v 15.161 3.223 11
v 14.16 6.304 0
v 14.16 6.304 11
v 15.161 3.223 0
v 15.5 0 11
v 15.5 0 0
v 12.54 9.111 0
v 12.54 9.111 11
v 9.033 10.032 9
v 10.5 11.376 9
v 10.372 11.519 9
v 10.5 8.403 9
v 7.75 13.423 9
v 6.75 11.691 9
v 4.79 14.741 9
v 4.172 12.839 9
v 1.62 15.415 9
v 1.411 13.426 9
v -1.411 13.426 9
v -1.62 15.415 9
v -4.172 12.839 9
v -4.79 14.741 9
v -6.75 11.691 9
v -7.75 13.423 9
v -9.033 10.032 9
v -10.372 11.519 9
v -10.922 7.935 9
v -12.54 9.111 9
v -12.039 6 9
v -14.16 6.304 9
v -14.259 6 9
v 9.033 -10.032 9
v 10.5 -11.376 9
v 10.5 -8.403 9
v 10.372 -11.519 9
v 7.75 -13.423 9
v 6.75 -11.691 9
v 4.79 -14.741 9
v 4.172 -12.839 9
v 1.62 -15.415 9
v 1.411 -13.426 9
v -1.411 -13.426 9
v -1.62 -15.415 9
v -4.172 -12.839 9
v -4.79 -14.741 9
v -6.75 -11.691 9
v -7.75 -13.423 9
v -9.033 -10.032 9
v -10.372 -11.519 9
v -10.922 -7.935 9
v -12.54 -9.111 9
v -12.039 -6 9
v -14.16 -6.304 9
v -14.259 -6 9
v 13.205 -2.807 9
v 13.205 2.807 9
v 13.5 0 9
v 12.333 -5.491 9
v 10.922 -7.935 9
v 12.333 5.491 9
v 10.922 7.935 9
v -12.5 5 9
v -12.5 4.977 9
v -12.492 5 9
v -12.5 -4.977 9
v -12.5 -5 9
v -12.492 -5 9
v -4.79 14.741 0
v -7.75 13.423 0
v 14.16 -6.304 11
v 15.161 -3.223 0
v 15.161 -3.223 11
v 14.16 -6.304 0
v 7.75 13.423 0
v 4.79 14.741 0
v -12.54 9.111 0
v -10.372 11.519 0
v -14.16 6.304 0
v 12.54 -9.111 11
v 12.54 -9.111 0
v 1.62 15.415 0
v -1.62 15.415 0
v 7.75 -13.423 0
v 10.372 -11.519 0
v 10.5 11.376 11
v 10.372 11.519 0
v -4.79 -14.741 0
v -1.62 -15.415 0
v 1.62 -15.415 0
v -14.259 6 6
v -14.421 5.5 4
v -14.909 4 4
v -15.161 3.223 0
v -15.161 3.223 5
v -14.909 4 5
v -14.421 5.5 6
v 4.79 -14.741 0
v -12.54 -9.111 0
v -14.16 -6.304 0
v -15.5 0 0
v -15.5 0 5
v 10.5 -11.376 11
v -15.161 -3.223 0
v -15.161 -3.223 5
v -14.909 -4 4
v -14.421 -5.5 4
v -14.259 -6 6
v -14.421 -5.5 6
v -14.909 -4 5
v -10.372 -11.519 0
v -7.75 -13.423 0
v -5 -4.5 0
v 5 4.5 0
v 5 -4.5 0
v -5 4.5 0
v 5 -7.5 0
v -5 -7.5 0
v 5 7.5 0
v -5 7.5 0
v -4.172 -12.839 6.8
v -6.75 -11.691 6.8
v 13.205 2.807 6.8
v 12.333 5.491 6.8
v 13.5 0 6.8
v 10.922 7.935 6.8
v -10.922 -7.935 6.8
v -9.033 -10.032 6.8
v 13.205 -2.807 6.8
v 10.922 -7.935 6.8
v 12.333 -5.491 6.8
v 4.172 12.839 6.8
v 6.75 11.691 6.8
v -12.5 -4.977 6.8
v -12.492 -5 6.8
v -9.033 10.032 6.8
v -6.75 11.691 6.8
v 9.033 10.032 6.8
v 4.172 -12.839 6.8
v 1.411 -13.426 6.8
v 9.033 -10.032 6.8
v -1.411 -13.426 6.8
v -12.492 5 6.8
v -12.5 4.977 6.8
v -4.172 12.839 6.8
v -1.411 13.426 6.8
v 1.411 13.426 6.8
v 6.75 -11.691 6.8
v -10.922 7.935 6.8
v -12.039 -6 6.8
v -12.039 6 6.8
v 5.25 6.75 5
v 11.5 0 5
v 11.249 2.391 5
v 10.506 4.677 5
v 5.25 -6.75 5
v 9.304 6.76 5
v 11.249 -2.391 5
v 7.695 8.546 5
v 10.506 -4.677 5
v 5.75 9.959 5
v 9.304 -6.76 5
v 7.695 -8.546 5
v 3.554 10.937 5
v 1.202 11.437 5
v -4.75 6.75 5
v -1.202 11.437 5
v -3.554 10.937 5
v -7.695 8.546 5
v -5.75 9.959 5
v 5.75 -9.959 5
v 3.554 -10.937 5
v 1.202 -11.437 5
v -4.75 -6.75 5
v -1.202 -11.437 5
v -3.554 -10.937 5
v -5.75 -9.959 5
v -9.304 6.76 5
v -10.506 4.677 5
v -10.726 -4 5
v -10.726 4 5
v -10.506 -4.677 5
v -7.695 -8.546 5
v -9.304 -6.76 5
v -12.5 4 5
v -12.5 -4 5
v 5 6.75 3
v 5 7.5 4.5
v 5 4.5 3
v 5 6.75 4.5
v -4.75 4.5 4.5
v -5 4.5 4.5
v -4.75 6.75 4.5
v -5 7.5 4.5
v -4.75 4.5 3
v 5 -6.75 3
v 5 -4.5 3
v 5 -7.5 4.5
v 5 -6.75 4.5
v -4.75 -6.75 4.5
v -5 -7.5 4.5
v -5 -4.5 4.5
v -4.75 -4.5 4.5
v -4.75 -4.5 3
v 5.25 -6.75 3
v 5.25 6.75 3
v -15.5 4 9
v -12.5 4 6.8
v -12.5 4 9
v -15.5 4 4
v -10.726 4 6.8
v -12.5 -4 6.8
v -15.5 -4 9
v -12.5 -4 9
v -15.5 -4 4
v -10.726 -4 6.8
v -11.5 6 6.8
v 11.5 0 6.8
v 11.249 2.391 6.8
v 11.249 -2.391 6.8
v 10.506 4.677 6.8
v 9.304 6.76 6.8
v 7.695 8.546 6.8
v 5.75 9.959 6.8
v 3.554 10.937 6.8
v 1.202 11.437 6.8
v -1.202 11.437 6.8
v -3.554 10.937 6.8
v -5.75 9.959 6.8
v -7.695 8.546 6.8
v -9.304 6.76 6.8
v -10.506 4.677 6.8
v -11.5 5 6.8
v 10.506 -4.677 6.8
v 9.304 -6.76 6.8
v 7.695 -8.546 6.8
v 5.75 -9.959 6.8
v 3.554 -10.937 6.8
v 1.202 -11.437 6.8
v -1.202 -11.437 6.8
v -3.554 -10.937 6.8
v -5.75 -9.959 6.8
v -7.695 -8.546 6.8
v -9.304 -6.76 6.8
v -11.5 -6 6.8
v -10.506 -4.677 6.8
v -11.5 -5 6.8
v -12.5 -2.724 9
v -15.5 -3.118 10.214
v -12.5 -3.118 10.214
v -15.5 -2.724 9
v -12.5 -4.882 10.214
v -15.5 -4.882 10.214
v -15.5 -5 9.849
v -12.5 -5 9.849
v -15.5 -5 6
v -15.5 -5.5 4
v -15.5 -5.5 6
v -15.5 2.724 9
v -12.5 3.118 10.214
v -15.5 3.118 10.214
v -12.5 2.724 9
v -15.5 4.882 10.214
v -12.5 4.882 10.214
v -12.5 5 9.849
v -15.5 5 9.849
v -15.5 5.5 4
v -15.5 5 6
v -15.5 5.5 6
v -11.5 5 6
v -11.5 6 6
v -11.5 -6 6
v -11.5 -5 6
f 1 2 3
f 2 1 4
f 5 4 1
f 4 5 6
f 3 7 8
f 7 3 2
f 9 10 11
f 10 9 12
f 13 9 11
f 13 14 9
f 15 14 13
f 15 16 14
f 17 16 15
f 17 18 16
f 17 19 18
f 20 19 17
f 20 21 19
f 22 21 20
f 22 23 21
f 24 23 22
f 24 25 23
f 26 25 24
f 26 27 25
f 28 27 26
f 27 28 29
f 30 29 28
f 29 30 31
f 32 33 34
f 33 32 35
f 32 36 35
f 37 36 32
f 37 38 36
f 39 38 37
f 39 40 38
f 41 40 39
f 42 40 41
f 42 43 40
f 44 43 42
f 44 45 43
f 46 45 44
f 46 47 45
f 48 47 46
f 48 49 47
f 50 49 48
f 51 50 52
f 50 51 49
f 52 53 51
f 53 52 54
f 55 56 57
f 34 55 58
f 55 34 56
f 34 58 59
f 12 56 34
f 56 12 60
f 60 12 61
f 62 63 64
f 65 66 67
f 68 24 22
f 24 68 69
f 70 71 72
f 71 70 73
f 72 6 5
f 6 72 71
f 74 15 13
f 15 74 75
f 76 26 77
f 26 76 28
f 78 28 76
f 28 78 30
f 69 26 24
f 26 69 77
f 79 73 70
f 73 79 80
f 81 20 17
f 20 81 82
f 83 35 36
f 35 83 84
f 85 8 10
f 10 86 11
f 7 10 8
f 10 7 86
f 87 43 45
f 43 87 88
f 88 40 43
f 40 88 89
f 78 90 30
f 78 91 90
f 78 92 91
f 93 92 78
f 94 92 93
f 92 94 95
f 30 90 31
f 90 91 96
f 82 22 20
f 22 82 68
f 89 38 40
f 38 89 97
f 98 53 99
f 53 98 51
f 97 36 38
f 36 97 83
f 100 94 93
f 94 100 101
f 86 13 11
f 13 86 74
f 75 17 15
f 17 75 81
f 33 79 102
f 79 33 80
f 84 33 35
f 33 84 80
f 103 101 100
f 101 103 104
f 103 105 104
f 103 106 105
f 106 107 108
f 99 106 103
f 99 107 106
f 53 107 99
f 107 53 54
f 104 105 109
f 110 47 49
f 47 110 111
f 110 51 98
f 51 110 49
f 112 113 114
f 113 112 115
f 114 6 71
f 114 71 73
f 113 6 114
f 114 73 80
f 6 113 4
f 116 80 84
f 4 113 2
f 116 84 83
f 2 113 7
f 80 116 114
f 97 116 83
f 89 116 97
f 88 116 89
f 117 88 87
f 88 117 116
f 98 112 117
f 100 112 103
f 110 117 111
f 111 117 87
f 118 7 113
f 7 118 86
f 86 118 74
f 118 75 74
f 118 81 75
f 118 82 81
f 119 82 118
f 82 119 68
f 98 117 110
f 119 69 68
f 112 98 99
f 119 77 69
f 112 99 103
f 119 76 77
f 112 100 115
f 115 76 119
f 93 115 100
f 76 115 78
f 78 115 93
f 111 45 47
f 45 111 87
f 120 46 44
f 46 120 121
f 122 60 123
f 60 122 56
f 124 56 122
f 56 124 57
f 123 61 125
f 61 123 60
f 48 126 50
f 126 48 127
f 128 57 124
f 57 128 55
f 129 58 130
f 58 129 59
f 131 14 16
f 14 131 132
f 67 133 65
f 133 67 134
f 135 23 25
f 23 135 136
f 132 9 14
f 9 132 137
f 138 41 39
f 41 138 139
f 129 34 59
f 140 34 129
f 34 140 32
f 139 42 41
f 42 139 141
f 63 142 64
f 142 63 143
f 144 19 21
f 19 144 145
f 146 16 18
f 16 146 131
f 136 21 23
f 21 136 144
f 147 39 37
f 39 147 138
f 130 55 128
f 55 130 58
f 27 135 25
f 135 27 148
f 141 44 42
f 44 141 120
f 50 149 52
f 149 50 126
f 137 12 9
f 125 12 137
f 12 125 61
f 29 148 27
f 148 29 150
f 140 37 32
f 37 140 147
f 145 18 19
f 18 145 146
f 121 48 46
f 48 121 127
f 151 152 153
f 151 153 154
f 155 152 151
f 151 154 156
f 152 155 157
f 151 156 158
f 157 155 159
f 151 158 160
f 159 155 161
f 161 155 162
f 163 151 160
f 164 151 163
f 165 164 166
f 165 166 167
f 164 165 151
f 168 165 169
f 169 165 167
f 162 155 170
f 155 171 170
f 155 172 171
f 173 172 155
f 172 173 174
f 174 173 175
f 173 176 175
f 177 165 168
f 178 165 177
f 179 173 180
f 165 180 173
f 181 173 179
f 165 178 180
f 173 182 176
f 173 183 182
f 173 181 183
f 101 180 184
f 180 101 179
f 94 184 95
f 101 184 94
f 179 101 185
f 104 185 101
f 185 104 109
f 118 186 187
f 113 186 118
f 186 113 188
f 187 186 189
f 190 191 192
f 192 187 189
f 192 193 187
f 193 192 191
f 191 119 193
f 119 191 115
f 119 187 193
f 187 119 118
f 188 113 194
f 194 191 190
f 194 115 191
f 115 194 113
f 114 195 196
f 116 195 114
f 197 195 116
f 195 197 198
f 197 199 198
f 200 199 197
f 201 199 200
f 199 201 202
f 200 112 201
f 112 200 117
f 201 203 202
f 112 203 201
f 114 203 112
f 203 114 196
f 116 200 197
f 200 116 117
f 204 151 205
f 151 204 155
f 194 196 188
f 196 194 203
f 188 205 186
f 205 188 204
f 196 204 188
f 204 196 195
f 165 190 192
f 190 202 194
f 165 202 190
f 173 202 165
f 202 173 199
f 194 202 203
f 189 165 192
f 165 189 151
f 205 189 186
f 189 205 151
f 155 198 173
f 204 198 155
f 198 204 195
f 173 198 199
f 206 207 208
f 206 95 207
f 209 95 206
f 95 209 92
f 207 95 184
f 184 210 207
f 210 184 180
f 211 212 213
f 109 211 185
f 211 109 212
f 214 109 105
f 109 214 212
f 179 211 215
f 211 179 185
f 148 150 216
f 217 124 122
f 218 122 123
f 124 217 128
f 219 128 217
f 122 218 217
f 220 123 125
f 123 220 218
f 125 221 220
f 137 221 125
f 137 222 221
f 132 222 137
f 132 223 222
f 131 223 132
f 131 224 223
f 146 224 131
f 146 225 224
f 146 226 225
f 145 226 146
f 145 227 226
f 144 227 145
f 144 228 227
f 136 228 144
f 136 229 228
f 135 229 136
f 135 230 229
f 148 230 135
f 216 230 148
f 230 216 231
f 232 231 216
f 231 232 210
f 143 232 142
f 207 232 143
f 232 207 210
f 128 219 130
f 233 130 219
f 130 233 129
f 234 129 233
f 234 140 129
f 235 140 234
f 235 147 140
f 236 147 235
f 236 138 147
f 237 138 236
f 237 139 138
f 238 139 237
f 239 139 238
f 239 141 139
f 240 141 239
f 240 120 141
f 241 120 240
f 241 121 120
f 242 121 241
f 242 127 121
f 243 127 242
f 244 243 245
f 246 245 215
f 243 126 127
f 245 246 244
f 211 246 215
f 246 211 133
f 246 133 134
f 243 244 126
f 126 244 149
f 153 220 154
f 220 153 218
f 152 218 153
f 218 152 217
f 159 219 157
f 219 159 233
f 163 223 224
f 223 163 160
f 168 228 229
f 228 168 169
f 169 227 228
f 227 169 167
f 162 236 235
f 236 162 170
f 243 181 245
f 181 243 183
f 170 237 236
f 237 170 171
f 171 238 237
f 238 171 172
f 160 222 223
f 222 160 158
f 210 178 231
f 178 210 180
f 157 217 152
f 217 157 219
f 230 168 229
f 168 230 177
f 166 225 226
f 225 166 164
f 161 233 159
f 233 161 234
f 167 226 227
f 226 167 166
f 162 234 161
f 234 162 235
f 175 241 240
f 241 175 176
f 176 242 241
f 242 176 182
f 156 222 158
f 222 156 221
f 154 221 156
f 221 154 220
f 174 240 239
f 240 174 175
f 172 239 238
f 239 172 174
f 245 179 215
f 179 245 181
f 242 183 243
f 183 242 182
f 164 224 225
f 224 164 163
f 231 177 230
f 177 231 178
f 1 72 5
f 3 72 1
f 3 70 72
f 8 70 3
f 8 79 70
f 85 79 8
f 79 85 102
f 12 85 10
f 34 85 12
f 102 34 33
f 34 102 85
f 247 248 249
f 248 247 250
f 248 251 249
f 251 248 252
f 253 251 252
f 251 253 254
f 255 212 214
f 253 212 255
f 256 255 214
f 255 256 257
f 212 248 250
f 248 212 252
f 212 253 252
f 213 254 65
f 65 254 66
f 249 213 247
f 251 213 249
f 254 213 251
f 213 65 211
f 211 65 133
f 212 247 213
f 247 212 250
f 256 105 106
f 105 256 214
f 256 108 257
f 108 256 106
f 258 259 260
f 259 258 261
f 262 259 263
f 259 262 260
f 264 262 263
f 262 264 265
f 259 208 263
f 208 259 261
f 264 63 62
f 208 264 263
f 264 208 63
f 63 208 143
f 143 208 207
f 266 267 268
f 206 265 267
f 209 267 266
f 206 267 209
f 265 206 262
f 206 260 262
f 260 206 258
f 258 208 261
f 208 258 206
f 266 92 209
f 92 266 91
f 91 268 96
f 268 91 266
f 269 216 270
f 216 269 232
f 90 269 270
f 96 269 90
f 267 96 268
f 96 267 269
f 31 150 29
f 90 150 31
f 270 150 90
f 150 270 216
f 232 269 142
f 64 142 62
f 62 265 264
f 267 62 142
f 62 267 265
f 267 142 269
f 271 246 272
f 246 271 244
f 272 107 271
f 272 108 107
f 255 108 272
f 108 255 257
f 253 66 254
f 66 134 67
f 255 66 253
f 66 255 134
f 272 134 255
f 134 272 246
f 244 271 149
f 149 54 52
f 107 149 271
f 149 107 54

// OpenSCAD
// This is a led lamp holder to clip onto the RepRap.
//
//  Copyright 2011 John Cooper 
//
//  This program is free software: you can redistribute it and/or modify
//  it under the terms of the GNU General Public License as published by
//  the Free Software Foundation, either version 3 of the License, or
//   (at your option) any later version.
//
//  This program is distributed in the hope that it will be useful,
//  but WITHOUT ANY WARRANTY; without even the implied warranty of
//  MERCHANTABILITY or FITNESS FOR A PARTICULAR PURPOSE.  See the
//  GNU General Public License for more details.
//
//  You should have received a copy of the GNU General Public License
//  along with this program.  If not, see <http://www.gnu.org/licenses/>.

bolt_thickness = 8;
lamp_radius = 27 / 2;
plug_width = 8;
strap_width = 10;

module bolt_clip (bolt_radius, length) {
    difference () {
        cylinder (h=length, r=bolt_radius * 1.1);
        translate ([0, 0, -0.5]) {
            cylinder (h=length + 1, r=bolt_radius);
        }
    }
}

module lamp_holder () {
    union () {
        difference () {
            cylinder ( h=9, r=lamp_radius + 2 );
            translate ([0,0,5]) {
                cylinder ( h=6, r=lamp_radius );
            }
            translate ([-( strap_width / 2 ), lamp_radius / 3, -0.5]) {
                 cube ([strap_width, 3, 5]);
            }
            translate ([-( strap_width / 2 ), - ( lamp_radius / 3 + 3) , -0.5]) {
                 cube ([strap_width, 3, 5]);
            }
            translate ([- (lamp_radius / 2 -2 ), -lamp_radius / 2, 3]) {
                cube ([ strap_width, lamp_radius, 4] );
            }
            // The hole for the connector
            translate ([ - lamp_radius -4 , - plug_width / 2 , 5]) {
                cube([8, plug_width, 6]);
            }
        }
        difference () {
            translate ([0,0,5]) {
                cylinder ( h=3 - 1.2, r=lamp_radius );
            }
            translate ([0,0,4.5]) {
                cylinder ( h=7, r=lamp_radius - 2 );
            }
            translate ([-lamp_radius,-plug_width/2,5]) {
                cube ([5,plug_width,3]);
            }
        }
    }
}

module lamp () {
    union () {
        cylinder (h=3, r=lamp_radius);
        translate ([lamp_radius - 5, - plug_width / 2   , 0]){
            cube ([10,plug_width,3]);
        }
    }
}

module top_clip () {
    intersection () {
        cylinder(h=2, r=lamp_radius + 2);
        translate ([lamp_radius -3 ,-15,0]) {
            cube ([6,30,3]);
        }
    }
}

module cable_clip () {
    union () {
        difference () {
            rotate ([0,90,0]) {
                cylinder (h=3,r=1.5);
            }
            translate ([-0.5,0, -4]) {
                cube ([4,4,4]);
            }
        }
        translate ([0,-1.5,-5]) {
            cube([3,1.5,5]);
        }
    }
}

module complete_lamp_holder () {
    difference () {
        union () {
            lamp_holder ();
            translate ([0,0,9]) {
                top_clip();
            }
            translate ([-(lamp_radius + 2), -plug_width / 2, 6+3]) {
                cable_clip ();
            }
            translate ([-(lamp_radius -1), plug_width / 2, 6+3]) {
                rotate([0,0,180]) {
                    cable_clip ();
                }
            }
        }
        translate ([-(lamp_radius + 3),plug_width / 2 + 1,6]) {
            cube ([5,1,4]);
        }
        translate ([-(lamp_radius + 3),-(plug_width / 2 + 2),6]) {
            cube ([5,1,4]);
        }
    }
}
translate ([0,0,6]) {
// lamp ();
}
complete_lamp_holder ();
